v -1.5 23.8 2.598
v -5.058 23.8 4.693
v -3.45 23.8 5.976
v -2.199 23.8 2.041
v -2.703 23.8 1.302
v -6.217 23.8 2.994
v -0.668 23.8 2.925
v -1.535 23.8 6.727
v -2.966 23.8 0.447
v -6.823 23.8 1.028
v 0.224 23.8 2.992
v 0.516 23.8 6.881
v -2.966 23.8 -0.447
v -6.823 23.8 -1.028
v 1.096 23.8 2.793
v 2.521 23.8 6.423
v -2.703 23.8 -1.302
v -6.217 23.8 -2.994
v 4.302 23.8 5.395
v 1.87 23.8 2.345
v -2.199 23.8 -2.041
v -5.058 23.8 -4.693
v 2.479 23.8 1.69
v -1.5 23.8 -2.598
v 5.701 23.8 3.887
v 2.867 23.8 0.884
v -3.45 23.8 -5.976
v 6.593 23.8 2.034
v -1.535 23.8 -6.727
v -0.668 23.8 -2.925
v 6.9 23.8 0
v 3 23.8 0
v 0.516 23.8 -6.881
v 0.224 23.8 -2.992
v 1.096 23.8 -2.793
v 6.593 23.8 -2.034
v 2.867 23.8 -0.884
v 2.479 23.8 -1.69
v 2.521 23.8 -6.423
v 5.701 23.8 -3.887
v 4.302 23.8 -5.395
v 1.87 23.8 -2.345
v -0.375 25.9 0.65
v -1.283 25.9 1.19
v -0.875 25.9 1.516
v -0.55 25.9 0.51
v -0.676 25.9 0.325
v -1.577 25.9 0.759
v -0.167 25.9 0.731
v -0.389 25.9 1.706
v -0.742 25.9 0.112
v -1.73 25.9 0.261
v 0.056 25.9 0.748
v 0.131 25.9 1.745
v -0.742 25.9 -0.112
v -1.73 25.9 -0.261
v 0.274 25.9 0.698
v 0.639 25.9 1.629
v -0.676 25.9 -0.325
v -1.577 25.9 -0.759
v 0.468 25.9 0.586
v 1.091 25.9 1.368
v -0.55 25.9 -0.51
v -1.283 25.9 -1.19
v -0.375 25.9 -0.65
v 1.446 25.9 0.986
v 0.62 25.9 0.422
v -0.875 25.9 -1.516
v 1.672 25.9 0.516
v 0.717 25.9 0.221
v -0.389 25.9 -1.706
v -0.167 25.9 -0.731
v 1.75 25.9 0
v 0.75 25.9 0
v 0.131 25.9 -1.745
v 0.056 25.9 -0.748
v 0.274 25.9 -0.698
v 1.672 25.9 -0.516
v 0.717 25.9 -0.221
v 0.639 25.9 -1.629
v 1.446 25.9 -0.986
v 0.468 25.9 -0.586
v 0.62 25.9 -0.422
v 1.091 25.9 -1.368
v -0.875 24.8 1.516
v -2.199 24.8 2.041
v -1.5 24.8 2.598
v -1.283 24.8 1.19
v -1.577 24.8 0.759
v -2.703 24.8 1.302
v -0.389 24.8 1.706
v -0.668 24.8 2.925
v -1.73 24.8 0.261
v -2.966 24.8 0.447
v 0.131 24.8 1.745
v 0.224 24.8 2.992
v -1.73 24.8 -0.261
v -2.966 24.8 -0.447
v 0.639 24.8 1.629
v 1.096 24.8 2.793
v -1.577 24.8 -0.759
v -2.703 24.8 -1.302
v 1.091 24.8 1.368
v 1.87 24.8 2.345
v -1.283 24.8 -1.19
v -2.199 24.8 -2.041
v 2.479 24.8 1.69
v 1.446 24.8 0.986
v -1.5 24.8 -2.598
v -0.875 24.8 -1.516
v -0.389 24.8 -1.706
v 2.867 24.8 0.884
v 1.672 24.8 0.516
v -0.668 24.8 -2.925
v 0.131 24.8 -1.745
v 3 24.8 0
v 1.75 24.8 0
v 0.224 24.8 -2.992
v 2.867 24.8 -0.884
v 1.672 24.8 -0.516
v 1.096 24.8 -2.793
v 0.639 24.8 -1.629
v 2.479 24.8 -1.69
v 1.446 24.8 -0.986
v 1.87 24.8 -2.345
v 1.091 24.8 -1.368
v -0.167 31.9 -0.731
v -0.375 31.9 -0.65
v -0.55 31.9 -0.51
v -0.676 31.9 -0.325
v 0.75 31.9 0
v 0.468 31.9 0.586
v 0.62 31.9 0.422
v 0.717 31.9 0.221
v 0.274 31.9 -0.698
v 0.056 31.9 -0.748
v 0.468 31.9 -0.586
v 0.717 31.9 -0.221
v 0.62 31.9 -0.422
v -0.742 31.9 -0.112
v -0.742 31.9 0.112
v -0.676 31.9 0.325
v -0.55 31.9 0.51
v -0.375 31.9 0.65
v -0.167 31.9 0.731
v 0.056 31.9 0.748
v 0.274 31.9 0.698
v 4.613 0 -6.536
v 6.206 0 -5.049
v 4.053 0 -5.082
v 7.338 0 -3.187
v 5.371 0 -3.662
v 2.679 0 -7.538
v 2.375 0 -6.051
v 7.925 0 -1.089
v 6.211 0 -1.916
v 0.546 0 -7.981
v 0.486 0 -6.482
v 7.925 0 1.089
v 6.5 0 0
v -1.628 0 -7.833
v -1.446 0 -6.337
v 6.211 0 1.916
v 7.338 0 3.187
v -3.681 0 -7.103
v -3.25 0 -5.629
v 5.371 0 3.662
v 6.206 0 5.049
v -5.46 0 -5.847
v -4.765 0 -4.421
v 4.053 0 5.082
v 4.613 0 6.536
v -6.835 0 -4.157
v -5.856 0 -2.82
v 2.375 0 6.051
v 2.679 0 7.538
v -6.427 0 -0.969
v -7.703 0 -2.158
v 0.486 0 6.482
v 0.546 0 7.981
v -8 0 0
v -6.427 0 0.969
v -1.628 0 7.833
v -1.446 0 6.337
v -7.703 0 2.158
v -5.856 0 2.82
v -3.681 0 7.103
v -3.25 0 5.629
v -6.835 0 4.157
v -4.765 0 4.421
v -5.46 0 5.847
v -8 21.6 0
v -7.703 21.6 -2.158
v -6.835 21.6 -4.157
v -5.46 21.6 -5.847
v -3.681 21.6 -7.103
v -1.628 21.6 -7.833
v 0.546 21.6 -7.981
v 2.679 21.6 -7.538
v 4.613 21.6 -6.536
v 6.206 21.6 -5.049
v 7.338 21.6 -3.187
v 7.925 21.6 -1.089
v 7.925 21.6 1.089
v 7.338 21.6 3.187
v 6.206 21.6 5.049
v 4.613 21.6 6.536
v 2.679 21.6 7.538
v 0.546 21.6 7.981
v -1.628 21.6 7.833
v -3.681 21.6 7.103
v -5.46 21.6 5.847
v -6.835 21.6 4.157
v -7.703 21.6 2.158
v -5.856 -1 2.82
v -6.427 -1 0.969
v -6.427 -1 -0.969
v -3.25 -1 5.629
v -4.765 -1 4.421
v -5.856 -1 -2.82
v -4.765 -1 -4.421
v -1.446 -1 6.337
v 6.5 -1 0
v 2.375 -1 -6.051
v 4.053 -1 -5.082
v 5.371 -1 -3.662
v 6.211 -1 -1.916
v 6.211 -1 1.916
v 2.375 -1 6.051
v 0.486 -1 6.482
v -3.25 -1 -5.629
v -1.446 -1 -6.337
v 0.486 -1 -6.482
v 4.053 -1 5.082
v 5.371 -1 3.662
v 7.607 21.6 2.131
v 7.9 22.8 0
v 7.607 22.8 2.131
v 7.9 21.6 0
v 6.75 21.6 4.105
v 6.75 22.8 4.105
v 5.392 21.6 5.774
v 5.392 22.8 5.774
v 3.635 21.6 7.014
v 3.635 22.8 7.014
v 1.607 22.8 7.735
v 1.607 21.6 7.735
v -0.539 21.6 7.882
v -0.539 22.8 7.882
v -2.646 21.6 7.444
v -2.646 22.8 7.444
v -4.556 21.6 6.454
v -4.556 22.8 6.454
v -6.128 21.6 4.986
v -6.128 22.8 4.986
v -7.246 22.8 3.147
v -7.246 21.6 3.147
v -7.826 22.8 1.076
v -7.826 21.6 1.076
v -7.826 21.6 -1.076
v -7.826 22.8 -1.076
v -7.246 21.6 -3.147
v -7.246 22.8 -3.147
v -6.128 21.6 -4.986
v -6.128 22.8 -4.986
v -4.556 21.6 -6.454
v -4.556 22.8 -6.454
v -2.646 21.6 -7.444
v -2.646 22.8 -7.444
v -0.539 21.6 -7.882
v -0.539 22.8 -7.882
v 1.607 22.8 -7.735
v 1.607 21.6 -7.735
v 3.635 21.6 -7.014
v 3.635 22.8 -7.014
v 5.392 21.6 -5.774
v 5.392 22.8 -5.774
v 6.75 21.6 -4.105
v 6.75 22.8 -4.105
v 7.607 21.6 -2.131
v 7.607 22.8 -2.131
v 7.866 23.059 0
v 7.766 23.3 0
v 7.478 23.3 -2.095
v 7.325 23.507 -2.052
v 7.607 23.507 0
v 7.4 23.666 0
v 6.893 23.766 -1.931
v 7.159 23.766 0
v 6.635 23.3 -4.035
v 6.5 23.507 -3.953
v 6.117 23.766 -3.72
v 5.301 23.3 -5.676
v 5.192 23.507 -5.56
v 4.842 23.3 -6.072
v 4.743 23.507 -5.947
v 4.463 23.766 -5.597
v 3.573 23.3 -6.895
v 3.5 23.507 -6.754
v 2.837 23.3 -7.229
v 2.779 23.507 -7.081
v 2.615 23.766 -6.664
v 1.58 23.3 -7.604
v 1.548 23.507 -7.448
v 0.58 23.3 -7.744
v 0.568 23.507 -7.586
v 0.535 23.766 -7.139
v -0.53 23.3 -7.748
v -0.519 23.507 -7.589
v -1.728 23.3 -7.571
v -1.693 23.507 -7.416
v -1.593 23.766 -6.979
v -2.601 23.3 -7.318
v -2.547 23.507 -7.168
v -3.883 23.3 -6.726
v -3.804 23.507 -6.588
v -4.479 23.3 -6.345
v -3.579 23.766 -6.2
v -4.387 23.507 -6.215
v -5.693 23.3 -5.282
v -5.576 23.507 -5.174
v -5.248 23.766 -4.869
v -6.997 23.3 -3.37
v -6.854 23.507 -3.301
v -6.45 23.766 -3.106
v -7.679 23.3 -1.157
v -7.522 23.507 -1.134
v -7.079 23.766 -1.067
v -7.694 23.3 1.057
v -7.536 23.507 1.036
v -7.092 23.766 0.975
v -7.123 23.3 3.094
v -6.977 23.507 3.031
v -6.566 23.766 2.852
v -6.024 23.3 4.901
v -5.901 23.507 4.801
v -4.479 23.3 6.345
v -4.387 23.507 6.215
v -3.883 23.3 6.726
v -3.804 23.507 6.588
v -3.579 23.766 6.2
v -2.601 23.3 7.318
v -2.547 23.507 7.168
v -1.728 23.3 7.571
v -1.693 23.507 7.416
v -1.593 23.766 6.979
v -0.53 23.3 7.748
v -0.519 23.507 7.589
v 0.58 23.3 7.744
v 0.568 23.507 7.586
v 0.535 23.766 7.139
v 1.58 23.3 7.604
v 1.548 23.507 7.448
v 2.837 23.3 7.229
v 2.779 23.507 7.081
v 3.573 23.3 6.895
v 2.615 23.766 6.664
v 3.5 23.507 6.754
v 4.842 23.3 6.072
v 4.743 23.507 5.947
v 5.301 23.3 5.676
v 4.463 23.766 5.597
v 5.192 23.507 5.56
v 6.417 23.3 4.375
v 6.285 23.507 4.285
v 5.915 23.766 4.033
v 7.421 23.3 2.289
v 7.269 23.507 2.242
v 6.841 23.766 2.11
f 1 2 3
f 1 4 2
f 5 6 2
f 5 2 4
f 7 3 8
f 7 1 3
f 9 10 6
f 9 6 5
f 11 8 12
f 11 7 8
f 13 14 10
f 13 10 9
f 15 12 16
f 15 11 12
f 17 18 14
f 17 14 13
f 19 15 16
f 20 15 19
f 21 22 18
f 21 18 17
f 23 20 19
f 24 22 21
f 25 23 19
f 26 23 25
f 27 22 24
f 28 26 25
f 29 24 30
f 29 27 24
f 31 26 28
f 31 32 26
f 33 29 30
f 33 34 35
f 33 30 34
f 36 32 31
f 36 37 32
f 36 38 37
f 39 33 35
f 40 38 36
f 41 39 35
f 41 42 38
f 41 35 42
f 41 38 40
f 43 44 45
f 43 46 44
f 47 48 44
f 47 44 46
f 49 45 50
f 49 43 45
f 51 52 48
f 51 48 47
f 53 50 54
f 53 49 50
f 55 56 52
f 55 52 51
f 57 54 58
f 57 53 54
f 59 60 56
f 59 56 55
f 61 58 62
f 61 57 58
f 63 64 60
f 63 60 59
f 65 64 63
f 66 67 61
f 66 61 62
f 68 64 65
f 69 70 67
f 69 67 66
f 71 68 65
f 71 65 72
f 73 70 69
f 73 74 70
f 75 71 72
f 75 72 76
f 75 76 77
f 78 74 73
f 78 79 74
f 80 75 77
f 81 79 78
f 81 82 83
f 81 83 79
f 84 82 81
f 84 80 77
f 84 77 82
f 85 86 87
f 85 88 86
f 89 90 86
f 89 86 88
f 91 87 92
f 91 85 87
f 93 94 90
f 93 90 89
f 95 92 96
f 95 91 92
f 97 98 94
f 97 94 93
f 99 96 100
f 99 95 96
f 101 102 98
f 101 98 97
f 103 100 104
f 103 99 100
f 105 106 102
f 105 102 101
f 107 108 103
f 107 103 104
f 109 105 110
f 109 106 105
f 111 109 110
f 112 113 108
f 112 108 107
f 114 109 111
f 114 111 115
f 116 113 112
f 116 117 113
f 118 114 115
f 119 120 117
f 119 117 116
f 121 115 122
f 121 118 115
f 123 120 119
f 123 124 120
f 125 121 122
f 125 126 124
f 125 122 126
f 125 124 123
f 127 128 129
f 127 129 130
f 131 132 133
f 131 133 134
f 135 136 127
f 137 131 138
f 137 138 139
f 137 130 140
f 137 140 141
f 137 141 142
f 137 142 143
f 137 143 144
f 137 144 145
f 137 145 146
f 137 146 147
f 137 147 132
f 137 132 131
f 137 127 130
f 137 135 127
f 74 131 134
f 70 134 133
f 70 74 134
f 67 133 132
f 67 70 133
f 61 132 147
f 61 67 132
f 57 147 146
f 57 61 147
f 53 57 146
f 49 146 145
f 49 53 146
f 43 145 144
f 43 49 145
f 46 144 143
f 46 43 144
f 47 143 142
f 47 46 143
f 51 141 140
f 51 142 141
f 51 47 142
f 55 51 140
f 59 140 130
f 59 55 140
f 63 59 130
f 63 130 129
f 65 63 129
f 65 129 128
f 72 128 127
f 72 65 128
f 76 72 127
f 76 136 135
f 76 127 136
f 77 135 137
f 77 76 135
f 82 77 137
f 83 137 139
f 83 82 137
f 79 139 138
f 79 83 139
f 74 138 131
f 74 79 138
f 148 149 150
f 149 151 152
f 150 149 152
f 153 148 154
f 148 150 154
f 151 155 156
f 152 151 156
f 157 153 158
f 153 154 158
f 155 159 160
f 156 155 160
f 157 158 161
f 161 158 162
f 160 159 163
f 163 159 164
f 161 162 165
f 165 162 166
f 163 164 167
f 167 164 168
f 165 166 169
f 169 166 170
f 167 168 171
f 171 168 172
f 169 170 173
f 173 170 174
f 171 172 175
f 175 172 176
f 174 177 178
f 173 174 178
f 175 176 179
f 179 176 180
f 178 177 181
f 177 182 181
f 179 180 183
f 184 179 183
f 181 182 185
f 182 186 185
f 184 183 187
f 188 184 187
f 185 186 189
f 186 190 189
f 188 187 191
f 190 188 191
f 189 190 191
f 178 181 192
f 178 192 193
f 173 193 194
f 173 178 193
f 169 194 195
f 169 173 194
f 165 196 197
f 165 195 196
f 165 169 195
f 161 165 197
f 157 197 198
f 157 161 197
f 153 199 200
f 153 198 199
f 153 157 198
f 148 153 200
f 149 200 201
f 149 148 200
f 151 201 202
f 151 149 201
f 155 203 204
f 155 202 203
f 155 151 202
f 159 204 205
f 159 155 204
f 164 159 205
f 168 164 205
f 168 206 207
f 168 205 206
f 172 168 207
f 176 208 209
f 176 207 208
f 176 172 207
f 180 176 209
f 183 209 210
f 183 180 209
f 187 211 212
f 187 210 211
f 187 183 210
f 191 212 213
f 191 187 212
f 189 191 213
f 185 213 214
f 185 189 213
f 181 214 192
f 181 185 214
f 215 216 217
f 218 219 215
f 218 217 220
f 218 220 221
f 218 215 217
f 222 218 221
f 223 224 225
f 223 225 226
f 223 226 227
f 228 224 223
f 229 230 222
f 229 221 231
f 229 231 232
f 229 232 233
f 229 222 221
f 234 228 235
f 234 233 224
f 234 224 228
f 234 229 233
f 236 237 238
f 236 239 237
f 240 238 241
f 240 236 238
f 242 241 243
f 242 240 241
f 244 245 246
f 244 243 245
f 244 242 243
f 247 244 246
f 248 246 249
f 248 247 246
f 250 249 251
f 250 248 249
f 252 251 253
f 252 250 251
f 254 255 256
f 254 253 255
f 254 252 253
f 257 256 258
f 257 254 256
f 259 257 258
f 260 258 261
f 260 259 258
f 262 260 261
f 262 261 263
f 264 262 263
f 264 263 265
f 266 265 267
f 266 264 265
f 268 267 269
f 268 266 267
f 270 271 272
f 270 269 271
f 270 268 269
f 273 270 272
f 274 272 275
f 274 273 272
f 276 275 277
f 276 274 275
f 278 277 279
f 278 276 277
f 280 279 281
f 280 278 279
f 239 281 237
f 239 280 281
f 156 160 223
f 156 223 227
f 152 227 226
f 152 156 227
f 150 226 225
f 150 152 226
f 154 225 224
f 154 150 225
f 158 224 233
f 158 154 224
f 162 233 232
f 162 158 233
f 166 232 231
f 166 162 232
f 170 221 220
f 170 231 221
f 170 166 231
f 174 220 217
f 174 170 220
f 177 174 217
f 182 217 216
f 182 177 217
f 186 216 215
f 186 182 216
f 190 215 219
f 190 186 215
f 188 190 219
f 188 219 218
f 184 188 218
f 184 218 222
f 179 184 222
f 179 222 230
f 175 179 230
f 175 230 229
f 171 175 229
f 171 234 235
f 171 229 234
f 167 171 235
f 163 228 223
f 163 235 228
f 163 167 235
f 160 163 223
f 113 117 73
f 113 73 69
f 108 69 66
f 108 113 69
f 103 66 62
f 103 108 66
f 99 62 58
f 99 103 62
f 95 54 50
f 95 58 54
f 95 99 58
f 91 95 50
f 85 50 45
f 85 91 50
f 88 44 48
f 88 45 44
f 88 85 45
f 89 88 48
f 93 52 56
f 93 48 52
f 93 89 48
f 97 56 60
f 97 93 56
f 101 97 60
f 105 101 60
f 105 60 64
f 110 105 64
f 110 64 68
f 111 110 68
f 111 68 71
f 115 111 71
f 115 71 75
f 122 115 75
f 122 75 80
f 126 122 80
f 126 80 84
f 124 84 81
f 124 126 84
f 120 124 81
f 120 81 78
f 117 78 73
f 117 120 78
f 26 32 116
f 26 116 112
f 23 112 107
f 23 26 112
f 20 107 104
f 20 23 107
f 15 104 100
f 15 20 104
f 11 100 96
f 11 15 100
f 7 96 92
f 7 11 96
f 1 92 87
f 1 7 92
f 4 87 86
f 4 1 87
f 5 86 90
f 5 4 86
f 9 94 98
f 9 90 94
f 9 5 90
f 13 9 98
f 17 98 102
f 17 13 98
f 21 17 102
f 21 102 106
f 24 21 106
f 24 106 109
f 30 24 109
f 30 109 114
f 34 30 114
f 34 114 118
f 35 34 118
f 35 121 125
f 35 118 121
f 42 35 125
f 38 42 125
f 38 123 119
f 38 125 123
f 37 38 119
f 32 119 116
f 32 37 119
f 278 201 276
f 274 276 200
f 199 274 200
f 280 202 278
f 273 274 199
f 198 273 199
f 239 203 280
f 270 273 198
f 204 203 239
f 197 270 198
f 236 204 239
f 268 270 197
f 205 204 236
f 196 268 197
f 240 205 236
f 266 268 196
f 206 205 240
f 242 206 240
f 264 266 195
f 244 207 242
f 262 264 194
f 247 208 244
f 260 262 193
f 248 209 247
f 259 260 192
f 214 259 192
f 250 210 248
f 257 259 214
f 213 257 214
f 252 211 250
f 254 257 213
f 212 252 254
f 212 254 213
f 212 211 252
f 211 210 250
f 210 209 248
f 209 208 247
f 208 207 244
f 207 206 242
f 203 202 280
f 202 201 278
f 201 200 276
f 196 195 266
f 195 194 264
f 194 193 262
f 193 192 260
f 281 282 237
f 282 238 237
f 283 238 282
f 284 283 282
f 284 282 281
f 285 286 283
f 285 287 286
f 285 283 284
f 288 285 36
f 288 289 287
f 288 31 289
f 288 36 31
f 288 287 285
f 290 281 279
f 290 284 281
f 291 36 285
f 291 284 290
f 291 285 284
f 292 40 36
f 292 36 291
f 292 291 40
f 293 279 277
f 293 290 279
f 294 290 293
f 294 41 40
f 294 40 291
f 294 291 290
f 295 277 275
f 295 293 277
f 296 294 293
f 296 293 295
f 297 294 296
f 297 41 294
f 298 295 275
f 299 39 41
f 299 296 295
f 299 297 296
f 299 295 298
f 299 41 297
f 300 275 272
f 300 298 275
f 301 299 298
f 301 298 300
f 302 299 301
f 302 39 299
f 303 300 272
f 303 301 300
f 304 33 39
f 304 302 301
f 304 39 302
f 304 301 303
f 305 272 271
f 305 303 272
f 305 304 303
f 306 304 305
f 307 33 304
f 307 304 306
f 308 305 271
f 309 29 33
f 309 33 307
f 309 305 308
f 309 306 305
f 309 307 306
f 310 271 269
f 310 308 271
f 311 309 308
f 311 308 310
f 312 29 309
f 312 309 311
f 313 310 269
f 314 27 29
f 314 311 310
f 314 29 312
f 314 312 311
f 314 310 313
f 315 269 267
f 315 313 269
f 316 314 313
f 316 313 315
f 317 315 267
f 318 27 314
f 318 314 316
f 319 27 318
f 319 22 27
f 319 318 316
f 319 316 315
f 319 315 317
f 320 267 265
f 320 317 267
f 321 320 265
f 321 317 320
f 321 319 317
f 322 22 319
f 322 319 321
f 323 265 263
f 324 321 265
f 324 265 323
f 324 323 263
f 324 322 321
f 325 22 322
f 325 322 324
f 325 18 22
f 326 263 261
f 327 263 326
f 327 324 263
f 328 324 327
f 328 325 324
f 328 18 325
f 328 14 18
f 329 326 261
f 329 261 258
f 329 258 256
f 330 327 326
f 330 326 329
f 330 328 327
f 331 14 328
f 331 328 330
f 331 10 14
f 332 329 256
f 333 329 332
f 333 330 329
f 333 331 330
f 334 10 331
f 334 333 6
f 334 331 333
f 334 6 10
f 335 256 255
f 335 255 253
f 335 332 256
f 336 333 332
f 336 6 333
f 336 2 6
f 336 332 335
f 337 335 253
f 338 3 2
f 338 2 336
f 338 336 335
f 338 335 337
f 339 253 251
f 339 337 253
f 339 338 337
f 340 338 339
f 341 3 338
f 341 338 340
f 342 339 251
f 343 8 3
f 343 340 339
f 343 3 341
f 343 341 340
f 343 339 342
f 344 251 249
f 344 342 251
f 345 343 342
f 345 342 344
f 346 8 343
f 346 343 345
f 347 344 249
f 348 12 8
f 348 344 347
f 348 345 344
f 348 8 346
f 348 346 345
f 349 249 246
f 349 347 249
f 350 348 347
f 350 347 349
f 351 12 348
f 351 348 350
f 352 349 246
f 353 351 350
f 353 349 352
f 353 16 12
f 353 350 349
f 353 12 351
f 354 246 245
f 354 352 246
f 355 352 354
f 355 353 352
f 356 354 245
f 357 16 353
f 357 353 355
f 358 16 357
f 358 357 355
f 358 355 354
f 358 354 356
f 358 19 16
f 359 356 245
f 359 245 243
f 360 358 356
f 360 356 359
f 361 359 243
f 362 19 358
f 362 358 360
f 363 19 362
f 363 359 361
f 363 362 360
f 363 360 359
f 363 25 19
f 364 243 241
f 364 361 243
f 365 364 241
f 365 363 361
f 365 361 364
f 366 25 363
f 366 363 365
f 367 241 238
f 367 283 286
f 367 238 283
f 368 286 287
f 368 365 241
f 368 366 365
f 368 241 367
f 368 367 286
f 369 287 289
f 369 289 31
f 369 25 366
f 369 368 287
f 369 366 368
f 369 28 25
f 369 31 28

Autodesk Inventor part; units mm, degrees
ref_plane "YZ Plane" through (0, 0, 0) normal (1, 0, 0) x (0, 1, 0)
ref_plane "XZ Plane" through (0, 0, 0) normal (0, 1, 0) x (-1, 0, 0)
ref_plane "XY Plane" through (0, 0, 0) normal (0, 0, 1) x (1, 0, 0)
sketch "Boceto1" plane through (0, 0, 0) normal (0, 1, 0) x (-1, 0, 0)
  circle A0 centre (0, 0) radius 8
  dimension "d0" = 16
extrude "Extrusión1" add sketch "Boceto1" along normal blind 21.6
sketch "Boceto2" plane through (0, 21.6, 0) normal (0, 1, 0) x (1, 0, 0)
  circle A0 centre (0, 0) radius 7.9
  dimension "d3" = 15.8
extrude "Extrusión2" add sketch "Boceto2" along normal blind 2.2
fillet "Empalme1" radius 1 1 edges at (-7.9, 23.8, 0)
sketch "Boceto3" plane through (0, 23.8, 0) normal (0, 1, 0) x (1, 0, 0)
  circle A0 centre (0, 0) radius 3
  circle A1 centre (0, 0) radius 1.75
  circle A2 centre (0, 0) radius 0.75
  dimension "d7" = 6
  dimension "d8" = 3.5
  dimension "d13" = 1.5
extrude "Extrusión3" add sketch "Boceto3" along normal blind 1 contours A0
extrude "Extrusión4" add sketch "Boceto3" along normal blind 2.1 contours A1 | A2
extrude "Extrusión5" add sketch "Boceto3" along normal blind 8.1 contours A2
sketch "Boceto4" plane through (0, 0, 0) normal (0, -1, 0) x (1, 0, 0)
  circle A0 centre (0, 0) radius 0.75 projected
  circle A1 centre (0, 0) radius 6.5
  dimension "d16" = 13
extrude "Extrusión6" add sketch "Boceto4" along normal blind 1 contours A0 | A1
properties part number "Motor" material "Acero inoxidable"
